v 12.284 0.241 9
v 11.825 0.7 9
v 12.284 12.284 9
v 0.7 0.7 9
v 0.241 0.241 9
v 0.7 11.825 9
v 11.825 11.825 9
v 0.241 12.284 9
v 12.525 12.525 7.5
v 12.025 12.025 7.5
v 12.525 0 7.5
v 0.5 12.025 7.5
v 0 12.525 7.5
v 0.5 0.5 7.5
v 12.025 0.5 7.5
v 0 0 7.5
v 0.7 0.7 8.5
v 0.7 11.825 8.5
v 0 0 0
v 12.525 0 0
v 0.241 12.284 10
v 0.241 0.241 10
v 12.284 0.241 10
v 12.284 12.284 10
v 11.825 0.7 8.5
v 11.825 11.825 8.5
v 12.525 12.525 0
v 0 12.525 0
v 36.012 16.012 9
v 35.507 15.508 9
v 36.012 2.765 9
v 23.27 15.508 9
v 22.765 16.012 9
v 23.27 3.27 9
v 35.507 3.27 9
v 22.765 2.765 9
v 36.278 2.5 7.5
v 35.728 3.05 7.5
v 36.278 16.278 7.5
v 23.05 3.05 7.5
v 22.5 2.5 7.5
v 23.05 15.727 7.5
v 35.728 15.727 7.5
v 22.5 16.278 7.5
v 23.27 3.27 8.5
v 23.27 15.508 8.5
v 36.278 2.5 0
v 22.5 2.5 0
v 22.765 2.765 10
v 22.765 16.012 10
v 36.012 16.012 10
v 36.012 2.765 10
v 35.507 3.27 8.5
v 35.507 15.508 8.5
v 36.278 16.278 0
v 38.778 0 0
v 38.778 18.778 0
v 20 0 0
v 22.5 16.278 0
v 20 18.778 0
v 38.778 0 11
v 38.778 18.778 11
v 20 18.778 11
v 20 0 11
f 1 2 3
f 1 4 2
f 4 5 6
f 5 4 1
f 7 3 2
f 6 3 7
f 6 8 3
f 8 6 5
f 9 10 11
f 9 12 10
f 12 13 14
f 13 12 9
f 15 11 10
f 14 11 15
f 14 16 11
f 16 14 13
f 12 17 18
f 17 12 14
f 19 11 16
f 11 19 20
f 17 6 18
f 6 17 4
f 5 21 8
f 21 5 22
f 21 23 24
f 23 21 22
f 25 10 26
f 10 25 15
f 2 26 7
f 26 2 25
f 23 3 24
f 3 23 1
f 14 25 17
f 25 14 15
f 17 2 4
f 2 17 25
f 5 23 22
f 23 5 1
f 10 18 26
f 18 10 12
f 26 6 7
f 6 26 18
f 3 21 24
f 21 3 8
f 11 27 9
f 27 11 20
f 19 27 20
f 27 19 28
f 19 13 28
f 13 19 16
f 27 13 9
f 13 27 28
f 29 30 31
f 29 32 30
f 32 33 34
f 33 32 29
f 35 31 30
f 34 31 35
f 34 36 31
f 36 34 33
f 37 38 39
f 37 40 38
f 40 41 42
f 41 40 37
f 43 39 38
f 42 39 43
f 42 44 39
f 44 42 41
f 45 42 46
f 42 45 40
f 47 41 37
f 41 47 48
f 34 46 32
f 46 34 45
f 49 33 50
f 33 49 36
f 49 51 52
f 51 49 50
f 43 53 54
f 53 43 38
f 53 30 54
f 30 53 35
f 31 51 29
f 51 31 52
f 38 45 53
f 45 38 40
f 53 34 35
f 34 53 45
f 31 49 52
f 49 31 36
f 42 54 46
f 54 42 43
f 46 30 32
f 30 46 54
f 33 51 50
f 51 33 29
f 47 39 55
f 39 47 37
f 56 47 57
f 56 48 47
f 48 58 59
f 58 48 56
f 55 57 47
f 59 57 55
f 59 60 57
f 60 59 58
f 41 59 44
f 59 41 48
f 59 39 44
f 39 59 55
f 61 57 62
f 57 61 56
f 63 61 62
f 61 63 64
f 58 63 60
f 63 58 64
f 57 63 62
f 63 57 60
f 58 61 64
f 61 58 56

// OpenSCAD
cubeWithSnaps();

translate([20, 0, 0])
cubeSnapInto();

module annularSnap(length_of_snap, trailing_trim_length) {
    translate([0,0,-0.01])
    hull() {
        cube([length_of_snap, 0.5, 0.51]);
        
        translate([0, 1, 0])
        cube([length_of_snap, 0.5, 0.71]);
    }
    
    translate([0, 1.5, -0.01])
    cube([length_of_snap, trailing_trim_length, 0.251]);
}

thread_diameter     = (3/8) * 25.4;  // in inches
cube_threads_offset = 3;
cube_size           = thread_diameter + cube_threads_offset;
cube_height         = 10;
module cubeWithSnaps() {
    difference() {
        cube([cube_size, cube_size, cube_height]);
        
        // left
        translate([0, 0, cube_height - 2.5])
        rotate([90, 0, 90])
        annularSnap(cube_size + 0.01, 1);
        
        // right
        translate([cube_size, cube_size, cube_height - 2.5])
        rotate([90, 0, 270])
        annularSnap(cube_size + 0.01, 1);
        
        // front
        translate([cube_size, 0, cube_height - 2.5])
        rotate([90, 0, 180])
        annularSnap(cube_size + 0.01, 1);
        
        // back
        translate([0, cube_size, cube_height - 2.5])
        rotate([90, 0, 0])
        annularSnap(cube_size + 0.01, 1);
    }
}

module cubeSnapInto() {
    my_cube_size    = (cube_size * 1.1) + 5;
    my_cube_height  = cube_height + 1;
    
    difference() {
        cube([my_cube_size, my_cube_size, my_cube_height]);
        
        translate([2.5, 2.5, 0])
        scale([1.1, 1.1, 1])
        cubeWithSnaps();
    }
}
